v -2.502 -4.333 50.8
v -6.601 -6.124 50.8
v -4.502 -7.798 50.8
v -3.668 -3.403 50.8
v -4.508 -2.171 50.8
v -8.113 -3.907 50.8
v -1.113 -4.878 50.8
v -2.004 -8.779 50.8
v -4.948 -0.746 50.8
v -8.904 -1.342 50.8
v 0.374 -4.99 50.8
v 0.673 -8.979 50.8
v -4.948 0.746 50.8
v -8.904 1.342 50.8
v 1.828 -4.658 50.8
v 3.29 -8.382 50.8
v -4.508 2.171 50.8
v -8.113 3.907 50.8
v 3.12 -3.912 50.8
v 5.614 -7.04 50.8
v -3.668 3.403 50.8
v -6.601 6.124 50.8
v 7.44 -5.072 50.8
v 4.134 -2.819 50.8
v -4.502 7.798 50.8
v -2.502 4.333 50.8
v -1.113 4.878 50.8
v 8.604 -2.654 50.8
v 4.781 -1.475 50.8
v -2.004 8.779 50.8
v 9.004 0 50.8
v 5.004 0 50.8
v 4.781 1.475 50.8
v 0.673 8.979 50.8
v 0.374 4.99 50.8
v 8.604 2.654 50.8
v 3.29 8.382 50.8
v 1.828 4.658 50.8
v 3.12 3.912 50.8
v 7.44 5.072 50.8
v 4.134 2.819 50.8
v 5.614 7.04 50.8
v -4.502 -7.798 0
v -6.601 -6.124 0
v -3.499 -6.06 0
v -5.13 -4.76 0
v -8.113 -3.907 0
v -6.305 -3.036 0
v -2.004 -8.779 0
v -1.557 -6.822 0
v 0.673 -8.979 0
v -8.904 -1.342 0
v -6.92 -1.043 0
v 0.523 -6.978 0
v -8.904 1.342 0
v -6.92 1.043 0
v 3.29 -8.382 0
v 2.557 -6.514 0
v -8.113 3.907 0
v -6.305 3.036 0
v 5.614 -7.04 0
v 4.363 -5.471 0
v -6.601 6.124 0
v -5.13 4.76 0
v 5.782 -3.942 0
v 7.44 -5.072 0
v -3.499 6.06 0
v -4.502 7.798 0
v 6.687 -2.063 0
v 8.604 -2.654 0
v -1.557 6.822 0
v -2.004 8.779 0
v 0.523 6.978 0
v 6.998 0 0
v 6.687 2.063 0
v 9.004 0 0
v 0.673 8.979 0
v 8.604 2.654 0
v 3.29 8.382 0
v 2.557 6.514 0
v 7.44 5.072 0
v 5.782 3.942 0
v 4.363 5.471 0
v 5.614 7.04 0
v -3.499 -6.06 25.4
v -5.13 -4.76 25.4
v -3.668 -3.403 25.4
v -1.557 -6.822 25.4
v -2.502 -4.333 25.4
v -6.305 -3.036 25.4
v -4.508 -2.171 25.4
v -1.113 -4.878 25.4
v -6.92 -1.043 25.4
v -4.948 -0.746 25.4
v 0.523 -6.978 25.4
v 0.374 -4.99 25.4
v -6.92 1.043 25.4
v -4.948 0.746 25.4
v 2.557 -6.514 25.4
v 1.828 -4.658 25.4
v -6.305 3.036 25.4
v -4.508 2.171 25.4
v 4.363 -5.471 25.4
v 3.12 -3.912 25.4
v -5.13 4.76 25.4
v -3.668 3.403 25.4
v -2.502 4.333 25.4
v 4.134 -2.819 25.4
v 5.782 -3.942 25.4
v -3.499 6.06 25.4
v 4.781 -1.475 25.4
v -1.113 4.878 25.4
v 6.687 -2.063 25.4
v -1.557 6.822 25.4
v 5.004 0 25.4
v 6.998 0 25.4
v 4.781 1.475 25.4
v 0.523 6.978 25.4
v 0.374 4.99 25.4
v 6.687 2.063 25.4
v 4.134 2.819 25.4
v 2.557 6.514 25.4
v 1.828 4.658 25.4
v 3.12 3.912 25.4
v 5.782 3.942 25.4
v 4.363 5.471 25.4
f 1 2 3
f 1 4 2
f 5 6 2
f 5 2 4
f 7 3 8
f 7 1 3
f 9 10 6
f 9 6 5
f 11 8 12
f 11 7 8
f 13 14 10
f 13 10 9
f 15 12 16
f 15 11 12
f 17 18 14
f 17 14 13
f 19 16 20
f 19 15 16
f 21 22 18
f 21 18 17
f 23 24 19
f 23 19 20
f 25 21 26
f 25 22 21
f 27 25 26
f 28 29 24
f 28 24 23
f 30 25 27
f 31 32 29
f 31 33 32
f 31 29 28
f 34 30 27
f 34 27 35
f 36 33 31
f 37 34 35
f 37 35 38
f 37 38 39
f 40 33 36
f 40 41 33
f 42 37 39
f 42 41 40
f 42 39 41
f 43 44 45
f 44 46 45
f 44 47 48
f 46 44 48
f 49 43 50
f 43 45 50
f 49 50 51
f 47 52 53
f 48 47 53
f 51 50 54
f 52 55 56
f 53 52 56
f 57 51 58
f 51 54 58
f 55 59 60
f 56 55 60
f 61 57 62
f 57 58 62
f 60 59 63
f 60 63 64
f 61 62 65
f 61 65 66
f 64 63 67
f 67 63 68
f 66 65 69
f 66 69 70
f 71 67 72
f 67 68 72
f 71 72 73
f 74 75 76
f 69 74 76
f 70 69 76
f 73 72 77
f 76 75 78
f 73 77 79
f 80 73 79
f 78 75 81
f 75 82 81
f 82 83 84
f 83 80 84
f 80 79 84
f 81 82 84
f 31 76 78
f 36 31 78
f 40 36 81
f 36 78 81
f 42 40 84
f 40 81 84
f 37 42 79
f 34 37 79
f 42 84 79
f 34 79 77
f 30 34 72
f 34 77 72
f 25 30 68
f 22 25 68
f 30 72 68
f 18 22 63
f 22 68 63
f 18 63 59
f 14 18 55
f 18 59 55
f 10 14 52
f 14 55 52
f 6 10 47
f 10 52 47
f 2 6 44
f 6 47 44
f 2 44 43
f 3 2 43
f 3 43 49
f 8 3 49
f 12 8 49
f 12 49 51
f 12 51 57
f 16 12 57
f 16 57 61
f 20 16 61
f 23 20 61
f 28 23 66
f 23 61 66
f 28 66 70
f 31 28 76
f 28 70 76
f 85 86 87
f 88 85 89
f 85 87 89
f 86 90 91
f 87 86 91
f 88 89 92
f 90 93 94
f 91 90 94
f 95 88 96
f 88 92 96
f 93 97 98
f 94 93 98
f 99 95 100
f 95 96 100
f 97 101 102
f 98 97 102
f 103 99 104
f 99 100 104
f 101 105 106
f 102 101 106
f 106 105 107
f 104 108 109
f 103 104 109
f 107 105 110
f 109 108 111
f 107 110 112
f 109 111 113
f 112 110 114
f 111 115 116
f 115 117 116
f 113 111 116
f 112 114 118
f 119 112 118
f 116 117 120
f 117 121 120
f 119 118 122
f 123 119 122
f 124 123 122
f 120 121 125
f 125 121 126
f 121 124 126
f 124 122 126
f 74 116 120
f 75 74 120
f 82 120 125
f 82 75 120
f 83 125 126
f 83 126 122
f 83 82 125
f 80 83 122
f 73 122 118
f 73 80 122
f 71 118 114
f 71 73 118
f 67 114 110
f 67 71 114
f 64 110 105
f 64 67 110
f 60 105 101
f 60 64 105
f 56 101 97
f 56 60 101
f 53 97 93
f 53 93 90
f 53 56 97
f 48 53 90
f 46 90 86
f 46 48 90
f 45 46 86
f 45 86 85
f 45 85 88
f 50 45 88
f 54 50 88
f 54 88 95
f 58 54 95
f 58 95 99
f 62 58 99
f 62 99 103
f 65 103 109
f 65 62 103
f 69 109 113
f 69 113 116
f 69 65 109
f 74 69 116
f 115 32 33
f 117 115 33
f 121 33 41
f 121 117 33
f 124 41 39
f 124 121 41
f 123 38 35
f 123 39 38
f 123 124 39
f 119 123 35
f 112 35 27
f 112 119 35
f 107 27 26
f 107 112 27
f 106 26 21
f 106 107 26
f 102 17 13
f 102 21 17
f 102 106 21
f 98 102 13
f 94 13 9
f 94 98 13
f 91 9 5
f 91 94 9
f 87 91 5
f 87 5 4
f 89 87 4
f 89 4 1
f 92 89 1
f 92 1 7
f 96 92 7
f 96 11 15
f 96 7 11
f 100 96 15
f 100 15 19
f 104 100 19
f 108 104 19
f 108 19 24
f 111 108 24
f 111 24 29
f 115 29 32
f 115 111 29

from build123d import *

# Parameters (mm, degrees)
F0_R          = 9.0043
F1_DEPTH      = 50.8
F2_R          = 5.0038
F3_DEPTH      = 85.09
F3_DEPTH_BACK = 25.4
F4_R          = 6.9977
F5_DEPTH      = 25.4


with BuildPart() as f1:
    # F0 (on Top) → F1 (new body)
    with BuildSketch(Plane.XY):
        Circle(F0_R)
    extrude(amount=F1_DEPTH)

    # F2 (on Top) → F3 (cut, two sides)
    with BuildSketch(Plane.XY) as f3_sk:
        Circle(F2_R)
    extrude(amount=F3_DEPTH, mode=Mode.SUBTRACT)
    extrude(f3_sk.sketch, amount=-F3_DEPTH_BACK, mode=Mode.SUBTRACT)

    # F4 (on Top) → F5 (cut)
    with BuildSketch(Plane.XY):
        Circle(F4_R)
    extrude(amount=F5_DEPTH, mode=Mode.SUBTRACT)


solid = f1.part
